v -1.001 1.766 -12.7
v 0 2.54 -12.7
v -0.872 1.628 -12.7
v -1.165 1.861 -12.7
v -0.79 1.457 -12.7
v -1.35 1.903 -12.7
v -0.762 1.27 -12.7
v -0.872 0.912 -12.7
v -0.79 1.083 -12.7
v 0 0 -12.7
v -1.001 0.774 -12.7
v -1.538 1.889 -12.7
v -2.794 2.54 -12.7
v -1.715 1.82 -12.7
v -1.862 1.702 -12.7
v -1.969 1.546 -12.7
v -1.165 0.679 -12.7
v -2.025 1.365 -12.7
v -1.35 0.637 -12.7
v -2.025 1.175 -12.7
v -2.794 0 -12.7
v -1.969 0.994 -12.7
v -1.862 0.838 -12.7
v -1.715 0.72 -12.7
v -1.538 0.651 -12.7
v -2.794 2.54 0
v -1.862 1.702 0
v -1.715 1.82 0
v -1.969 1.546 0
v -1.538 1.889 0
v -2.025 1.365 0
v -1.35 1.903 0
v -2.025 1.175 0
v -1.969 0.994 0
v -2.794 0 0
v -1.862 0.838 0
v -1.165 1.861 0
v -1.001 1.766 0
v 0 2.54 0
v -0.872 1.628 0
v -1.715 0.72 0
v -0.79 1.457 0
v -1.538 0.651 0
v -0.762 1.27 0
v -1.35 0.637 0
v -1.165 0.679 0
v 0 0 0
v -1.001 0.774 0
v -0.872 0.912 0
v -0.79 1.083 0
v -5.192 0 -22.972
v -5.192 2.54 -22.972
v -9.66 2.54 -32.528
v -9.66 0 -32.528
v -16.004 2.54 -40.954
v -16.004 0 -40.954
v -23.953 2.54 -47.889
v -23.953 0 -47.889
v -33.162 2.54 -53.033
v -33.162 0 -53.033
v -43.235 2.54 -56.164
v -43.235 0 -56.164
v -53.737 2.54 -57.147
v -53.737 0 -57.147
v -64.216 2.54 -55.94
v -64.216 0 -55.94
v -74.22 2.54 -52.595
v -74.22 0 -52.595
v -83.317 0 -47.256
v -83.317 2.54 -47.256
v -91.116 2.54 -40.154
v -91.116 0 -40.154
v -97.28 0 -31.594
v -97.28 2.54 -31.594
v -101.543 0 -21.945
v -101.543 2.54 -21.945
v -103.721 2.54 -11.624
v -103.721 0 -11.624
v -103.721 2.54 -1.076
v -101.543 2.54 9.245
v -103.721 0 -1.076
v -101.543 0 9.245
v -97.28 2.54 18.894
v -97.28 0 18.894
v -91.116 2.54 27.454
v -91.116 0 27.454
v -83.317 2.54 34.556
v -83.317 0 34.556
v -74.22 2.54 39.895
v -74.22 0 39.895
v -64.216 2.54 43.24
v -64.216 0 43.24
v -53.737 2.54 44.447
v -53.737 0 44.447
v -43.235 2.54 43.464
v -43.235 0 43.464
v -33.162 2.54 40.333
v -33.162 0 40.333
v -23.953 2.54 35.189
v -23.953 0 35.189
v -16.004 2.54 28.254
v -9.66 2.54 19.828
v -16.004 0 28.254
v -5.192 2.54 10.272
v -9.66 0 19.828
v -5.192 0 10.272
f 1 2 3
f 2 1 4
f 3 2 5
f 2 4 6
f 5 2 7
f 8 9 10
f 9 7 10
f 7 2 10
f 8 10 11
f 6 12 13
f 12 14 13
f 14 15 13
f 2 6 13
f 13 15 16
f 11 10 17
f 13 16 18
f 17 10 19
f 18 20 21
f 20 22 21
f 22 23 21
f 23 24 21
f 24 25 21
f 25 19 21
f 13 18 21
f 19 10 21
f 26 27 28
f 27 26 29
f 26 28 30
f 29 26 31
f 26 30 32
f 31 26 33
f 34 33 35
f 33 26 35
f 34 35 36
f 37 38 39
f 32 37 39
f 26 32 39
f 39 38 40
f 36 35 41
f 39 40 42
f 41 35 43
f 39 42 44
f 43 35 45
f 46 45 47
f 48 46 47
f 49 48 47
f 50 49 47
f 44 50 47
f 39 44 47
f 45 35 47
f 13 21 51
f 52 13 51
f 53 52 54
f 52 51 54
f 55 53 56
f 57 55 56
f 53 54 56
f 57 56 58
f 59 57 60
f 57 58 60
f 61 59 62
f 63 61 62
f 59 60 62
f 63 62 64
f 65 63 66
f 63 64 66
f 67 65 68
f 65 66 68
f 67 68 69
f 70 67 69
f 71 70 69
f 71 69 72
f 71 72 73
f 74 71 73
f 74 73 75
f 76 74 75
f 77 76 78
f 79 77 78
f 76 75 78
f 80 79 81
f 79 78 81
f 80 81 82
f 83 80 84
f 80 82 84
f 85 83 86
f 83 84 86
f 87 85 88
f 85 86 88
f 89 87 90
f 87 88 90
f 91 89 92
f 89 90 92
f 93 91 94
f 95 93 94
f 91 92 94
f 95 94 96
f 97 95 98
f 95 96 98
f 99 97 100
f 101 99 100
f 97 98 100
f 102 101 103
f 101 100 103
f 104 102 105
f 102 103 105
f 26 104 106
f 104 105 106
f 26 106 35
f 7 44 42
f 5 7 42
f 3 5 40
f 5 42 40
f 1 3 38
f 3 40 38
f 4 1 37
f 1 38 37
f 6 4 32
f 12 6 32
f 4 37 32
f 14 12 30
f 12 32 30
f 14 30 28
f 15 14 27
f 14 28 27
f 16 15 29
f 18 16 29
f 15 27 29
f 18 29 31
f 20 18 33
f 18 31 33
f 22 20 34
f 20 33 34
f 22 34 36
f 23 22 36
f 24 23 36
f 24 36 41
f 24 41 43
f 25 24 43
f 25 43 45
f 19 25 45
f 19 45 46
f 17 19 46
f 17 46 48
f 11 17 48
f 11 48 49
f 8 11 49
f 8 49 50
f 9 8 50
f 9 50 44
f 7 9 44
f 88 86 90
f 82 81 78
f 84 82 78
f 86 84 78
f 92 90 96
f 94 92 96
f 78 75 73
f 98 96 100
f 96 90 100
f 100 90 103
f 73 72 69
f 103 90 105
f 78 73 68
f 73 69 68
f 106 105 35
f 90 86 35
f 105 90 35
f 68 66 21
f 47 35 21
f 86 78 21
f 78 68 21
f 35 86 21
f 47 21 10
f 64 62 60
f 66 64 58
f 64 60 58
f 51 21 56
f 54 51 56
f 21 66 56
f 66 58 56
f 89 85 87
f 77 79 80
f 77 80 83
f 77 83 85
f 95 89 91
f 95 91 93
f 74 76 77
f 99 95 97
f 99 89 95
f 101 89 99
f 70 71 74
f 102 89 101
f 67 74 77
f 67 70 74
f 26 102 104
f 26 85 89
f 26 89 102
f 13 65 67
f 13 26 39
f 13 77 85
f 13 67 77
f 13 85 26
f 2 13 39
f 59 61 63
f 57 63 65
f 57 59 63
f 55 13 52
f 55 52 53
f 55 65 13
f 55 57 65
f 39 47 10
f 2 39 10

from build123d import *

# Parameters (mm, degrees)
BOSS_EXTRUDE1_DEPTH = 2.54
SKETCH2_R           = 0.635
CUT_EXTRUDE1_DEPTH  = 119.691411293


with BuildPart() as part:
    # Sketch1 → Boss-Extrude1 (new body)
    with BuildSketch(Plane(origin=(0, 0, 0), x_dir=(1, 0, 0), z_dir=(0, 1, 0))):
        with BuildLine():
            Line((0, 0), (0, 12.7))
            Line((0, 12.7), (-2.794, 12.7))
            ThreePointArc((-2.794, 12.7), (-103.995562476, 6.35), (-2.794, 0))
            Line((-2.794, 0), (0, 0))
        make_face()
    extrude(amount=BOSS_EXTRUDE1_DEPTH)

    # Sketch2 → Cut-Extrude1 (cut, through all)
    with BuildSketch(Plane.XY):
        with Locations((-1.397, 1.27)):
            Circle(SKETCH2_R)
    extrude(amount=-CUT_EXTRUDE1_DEPTH, mode=Mode.SUBTRACT)


solid = part.part
